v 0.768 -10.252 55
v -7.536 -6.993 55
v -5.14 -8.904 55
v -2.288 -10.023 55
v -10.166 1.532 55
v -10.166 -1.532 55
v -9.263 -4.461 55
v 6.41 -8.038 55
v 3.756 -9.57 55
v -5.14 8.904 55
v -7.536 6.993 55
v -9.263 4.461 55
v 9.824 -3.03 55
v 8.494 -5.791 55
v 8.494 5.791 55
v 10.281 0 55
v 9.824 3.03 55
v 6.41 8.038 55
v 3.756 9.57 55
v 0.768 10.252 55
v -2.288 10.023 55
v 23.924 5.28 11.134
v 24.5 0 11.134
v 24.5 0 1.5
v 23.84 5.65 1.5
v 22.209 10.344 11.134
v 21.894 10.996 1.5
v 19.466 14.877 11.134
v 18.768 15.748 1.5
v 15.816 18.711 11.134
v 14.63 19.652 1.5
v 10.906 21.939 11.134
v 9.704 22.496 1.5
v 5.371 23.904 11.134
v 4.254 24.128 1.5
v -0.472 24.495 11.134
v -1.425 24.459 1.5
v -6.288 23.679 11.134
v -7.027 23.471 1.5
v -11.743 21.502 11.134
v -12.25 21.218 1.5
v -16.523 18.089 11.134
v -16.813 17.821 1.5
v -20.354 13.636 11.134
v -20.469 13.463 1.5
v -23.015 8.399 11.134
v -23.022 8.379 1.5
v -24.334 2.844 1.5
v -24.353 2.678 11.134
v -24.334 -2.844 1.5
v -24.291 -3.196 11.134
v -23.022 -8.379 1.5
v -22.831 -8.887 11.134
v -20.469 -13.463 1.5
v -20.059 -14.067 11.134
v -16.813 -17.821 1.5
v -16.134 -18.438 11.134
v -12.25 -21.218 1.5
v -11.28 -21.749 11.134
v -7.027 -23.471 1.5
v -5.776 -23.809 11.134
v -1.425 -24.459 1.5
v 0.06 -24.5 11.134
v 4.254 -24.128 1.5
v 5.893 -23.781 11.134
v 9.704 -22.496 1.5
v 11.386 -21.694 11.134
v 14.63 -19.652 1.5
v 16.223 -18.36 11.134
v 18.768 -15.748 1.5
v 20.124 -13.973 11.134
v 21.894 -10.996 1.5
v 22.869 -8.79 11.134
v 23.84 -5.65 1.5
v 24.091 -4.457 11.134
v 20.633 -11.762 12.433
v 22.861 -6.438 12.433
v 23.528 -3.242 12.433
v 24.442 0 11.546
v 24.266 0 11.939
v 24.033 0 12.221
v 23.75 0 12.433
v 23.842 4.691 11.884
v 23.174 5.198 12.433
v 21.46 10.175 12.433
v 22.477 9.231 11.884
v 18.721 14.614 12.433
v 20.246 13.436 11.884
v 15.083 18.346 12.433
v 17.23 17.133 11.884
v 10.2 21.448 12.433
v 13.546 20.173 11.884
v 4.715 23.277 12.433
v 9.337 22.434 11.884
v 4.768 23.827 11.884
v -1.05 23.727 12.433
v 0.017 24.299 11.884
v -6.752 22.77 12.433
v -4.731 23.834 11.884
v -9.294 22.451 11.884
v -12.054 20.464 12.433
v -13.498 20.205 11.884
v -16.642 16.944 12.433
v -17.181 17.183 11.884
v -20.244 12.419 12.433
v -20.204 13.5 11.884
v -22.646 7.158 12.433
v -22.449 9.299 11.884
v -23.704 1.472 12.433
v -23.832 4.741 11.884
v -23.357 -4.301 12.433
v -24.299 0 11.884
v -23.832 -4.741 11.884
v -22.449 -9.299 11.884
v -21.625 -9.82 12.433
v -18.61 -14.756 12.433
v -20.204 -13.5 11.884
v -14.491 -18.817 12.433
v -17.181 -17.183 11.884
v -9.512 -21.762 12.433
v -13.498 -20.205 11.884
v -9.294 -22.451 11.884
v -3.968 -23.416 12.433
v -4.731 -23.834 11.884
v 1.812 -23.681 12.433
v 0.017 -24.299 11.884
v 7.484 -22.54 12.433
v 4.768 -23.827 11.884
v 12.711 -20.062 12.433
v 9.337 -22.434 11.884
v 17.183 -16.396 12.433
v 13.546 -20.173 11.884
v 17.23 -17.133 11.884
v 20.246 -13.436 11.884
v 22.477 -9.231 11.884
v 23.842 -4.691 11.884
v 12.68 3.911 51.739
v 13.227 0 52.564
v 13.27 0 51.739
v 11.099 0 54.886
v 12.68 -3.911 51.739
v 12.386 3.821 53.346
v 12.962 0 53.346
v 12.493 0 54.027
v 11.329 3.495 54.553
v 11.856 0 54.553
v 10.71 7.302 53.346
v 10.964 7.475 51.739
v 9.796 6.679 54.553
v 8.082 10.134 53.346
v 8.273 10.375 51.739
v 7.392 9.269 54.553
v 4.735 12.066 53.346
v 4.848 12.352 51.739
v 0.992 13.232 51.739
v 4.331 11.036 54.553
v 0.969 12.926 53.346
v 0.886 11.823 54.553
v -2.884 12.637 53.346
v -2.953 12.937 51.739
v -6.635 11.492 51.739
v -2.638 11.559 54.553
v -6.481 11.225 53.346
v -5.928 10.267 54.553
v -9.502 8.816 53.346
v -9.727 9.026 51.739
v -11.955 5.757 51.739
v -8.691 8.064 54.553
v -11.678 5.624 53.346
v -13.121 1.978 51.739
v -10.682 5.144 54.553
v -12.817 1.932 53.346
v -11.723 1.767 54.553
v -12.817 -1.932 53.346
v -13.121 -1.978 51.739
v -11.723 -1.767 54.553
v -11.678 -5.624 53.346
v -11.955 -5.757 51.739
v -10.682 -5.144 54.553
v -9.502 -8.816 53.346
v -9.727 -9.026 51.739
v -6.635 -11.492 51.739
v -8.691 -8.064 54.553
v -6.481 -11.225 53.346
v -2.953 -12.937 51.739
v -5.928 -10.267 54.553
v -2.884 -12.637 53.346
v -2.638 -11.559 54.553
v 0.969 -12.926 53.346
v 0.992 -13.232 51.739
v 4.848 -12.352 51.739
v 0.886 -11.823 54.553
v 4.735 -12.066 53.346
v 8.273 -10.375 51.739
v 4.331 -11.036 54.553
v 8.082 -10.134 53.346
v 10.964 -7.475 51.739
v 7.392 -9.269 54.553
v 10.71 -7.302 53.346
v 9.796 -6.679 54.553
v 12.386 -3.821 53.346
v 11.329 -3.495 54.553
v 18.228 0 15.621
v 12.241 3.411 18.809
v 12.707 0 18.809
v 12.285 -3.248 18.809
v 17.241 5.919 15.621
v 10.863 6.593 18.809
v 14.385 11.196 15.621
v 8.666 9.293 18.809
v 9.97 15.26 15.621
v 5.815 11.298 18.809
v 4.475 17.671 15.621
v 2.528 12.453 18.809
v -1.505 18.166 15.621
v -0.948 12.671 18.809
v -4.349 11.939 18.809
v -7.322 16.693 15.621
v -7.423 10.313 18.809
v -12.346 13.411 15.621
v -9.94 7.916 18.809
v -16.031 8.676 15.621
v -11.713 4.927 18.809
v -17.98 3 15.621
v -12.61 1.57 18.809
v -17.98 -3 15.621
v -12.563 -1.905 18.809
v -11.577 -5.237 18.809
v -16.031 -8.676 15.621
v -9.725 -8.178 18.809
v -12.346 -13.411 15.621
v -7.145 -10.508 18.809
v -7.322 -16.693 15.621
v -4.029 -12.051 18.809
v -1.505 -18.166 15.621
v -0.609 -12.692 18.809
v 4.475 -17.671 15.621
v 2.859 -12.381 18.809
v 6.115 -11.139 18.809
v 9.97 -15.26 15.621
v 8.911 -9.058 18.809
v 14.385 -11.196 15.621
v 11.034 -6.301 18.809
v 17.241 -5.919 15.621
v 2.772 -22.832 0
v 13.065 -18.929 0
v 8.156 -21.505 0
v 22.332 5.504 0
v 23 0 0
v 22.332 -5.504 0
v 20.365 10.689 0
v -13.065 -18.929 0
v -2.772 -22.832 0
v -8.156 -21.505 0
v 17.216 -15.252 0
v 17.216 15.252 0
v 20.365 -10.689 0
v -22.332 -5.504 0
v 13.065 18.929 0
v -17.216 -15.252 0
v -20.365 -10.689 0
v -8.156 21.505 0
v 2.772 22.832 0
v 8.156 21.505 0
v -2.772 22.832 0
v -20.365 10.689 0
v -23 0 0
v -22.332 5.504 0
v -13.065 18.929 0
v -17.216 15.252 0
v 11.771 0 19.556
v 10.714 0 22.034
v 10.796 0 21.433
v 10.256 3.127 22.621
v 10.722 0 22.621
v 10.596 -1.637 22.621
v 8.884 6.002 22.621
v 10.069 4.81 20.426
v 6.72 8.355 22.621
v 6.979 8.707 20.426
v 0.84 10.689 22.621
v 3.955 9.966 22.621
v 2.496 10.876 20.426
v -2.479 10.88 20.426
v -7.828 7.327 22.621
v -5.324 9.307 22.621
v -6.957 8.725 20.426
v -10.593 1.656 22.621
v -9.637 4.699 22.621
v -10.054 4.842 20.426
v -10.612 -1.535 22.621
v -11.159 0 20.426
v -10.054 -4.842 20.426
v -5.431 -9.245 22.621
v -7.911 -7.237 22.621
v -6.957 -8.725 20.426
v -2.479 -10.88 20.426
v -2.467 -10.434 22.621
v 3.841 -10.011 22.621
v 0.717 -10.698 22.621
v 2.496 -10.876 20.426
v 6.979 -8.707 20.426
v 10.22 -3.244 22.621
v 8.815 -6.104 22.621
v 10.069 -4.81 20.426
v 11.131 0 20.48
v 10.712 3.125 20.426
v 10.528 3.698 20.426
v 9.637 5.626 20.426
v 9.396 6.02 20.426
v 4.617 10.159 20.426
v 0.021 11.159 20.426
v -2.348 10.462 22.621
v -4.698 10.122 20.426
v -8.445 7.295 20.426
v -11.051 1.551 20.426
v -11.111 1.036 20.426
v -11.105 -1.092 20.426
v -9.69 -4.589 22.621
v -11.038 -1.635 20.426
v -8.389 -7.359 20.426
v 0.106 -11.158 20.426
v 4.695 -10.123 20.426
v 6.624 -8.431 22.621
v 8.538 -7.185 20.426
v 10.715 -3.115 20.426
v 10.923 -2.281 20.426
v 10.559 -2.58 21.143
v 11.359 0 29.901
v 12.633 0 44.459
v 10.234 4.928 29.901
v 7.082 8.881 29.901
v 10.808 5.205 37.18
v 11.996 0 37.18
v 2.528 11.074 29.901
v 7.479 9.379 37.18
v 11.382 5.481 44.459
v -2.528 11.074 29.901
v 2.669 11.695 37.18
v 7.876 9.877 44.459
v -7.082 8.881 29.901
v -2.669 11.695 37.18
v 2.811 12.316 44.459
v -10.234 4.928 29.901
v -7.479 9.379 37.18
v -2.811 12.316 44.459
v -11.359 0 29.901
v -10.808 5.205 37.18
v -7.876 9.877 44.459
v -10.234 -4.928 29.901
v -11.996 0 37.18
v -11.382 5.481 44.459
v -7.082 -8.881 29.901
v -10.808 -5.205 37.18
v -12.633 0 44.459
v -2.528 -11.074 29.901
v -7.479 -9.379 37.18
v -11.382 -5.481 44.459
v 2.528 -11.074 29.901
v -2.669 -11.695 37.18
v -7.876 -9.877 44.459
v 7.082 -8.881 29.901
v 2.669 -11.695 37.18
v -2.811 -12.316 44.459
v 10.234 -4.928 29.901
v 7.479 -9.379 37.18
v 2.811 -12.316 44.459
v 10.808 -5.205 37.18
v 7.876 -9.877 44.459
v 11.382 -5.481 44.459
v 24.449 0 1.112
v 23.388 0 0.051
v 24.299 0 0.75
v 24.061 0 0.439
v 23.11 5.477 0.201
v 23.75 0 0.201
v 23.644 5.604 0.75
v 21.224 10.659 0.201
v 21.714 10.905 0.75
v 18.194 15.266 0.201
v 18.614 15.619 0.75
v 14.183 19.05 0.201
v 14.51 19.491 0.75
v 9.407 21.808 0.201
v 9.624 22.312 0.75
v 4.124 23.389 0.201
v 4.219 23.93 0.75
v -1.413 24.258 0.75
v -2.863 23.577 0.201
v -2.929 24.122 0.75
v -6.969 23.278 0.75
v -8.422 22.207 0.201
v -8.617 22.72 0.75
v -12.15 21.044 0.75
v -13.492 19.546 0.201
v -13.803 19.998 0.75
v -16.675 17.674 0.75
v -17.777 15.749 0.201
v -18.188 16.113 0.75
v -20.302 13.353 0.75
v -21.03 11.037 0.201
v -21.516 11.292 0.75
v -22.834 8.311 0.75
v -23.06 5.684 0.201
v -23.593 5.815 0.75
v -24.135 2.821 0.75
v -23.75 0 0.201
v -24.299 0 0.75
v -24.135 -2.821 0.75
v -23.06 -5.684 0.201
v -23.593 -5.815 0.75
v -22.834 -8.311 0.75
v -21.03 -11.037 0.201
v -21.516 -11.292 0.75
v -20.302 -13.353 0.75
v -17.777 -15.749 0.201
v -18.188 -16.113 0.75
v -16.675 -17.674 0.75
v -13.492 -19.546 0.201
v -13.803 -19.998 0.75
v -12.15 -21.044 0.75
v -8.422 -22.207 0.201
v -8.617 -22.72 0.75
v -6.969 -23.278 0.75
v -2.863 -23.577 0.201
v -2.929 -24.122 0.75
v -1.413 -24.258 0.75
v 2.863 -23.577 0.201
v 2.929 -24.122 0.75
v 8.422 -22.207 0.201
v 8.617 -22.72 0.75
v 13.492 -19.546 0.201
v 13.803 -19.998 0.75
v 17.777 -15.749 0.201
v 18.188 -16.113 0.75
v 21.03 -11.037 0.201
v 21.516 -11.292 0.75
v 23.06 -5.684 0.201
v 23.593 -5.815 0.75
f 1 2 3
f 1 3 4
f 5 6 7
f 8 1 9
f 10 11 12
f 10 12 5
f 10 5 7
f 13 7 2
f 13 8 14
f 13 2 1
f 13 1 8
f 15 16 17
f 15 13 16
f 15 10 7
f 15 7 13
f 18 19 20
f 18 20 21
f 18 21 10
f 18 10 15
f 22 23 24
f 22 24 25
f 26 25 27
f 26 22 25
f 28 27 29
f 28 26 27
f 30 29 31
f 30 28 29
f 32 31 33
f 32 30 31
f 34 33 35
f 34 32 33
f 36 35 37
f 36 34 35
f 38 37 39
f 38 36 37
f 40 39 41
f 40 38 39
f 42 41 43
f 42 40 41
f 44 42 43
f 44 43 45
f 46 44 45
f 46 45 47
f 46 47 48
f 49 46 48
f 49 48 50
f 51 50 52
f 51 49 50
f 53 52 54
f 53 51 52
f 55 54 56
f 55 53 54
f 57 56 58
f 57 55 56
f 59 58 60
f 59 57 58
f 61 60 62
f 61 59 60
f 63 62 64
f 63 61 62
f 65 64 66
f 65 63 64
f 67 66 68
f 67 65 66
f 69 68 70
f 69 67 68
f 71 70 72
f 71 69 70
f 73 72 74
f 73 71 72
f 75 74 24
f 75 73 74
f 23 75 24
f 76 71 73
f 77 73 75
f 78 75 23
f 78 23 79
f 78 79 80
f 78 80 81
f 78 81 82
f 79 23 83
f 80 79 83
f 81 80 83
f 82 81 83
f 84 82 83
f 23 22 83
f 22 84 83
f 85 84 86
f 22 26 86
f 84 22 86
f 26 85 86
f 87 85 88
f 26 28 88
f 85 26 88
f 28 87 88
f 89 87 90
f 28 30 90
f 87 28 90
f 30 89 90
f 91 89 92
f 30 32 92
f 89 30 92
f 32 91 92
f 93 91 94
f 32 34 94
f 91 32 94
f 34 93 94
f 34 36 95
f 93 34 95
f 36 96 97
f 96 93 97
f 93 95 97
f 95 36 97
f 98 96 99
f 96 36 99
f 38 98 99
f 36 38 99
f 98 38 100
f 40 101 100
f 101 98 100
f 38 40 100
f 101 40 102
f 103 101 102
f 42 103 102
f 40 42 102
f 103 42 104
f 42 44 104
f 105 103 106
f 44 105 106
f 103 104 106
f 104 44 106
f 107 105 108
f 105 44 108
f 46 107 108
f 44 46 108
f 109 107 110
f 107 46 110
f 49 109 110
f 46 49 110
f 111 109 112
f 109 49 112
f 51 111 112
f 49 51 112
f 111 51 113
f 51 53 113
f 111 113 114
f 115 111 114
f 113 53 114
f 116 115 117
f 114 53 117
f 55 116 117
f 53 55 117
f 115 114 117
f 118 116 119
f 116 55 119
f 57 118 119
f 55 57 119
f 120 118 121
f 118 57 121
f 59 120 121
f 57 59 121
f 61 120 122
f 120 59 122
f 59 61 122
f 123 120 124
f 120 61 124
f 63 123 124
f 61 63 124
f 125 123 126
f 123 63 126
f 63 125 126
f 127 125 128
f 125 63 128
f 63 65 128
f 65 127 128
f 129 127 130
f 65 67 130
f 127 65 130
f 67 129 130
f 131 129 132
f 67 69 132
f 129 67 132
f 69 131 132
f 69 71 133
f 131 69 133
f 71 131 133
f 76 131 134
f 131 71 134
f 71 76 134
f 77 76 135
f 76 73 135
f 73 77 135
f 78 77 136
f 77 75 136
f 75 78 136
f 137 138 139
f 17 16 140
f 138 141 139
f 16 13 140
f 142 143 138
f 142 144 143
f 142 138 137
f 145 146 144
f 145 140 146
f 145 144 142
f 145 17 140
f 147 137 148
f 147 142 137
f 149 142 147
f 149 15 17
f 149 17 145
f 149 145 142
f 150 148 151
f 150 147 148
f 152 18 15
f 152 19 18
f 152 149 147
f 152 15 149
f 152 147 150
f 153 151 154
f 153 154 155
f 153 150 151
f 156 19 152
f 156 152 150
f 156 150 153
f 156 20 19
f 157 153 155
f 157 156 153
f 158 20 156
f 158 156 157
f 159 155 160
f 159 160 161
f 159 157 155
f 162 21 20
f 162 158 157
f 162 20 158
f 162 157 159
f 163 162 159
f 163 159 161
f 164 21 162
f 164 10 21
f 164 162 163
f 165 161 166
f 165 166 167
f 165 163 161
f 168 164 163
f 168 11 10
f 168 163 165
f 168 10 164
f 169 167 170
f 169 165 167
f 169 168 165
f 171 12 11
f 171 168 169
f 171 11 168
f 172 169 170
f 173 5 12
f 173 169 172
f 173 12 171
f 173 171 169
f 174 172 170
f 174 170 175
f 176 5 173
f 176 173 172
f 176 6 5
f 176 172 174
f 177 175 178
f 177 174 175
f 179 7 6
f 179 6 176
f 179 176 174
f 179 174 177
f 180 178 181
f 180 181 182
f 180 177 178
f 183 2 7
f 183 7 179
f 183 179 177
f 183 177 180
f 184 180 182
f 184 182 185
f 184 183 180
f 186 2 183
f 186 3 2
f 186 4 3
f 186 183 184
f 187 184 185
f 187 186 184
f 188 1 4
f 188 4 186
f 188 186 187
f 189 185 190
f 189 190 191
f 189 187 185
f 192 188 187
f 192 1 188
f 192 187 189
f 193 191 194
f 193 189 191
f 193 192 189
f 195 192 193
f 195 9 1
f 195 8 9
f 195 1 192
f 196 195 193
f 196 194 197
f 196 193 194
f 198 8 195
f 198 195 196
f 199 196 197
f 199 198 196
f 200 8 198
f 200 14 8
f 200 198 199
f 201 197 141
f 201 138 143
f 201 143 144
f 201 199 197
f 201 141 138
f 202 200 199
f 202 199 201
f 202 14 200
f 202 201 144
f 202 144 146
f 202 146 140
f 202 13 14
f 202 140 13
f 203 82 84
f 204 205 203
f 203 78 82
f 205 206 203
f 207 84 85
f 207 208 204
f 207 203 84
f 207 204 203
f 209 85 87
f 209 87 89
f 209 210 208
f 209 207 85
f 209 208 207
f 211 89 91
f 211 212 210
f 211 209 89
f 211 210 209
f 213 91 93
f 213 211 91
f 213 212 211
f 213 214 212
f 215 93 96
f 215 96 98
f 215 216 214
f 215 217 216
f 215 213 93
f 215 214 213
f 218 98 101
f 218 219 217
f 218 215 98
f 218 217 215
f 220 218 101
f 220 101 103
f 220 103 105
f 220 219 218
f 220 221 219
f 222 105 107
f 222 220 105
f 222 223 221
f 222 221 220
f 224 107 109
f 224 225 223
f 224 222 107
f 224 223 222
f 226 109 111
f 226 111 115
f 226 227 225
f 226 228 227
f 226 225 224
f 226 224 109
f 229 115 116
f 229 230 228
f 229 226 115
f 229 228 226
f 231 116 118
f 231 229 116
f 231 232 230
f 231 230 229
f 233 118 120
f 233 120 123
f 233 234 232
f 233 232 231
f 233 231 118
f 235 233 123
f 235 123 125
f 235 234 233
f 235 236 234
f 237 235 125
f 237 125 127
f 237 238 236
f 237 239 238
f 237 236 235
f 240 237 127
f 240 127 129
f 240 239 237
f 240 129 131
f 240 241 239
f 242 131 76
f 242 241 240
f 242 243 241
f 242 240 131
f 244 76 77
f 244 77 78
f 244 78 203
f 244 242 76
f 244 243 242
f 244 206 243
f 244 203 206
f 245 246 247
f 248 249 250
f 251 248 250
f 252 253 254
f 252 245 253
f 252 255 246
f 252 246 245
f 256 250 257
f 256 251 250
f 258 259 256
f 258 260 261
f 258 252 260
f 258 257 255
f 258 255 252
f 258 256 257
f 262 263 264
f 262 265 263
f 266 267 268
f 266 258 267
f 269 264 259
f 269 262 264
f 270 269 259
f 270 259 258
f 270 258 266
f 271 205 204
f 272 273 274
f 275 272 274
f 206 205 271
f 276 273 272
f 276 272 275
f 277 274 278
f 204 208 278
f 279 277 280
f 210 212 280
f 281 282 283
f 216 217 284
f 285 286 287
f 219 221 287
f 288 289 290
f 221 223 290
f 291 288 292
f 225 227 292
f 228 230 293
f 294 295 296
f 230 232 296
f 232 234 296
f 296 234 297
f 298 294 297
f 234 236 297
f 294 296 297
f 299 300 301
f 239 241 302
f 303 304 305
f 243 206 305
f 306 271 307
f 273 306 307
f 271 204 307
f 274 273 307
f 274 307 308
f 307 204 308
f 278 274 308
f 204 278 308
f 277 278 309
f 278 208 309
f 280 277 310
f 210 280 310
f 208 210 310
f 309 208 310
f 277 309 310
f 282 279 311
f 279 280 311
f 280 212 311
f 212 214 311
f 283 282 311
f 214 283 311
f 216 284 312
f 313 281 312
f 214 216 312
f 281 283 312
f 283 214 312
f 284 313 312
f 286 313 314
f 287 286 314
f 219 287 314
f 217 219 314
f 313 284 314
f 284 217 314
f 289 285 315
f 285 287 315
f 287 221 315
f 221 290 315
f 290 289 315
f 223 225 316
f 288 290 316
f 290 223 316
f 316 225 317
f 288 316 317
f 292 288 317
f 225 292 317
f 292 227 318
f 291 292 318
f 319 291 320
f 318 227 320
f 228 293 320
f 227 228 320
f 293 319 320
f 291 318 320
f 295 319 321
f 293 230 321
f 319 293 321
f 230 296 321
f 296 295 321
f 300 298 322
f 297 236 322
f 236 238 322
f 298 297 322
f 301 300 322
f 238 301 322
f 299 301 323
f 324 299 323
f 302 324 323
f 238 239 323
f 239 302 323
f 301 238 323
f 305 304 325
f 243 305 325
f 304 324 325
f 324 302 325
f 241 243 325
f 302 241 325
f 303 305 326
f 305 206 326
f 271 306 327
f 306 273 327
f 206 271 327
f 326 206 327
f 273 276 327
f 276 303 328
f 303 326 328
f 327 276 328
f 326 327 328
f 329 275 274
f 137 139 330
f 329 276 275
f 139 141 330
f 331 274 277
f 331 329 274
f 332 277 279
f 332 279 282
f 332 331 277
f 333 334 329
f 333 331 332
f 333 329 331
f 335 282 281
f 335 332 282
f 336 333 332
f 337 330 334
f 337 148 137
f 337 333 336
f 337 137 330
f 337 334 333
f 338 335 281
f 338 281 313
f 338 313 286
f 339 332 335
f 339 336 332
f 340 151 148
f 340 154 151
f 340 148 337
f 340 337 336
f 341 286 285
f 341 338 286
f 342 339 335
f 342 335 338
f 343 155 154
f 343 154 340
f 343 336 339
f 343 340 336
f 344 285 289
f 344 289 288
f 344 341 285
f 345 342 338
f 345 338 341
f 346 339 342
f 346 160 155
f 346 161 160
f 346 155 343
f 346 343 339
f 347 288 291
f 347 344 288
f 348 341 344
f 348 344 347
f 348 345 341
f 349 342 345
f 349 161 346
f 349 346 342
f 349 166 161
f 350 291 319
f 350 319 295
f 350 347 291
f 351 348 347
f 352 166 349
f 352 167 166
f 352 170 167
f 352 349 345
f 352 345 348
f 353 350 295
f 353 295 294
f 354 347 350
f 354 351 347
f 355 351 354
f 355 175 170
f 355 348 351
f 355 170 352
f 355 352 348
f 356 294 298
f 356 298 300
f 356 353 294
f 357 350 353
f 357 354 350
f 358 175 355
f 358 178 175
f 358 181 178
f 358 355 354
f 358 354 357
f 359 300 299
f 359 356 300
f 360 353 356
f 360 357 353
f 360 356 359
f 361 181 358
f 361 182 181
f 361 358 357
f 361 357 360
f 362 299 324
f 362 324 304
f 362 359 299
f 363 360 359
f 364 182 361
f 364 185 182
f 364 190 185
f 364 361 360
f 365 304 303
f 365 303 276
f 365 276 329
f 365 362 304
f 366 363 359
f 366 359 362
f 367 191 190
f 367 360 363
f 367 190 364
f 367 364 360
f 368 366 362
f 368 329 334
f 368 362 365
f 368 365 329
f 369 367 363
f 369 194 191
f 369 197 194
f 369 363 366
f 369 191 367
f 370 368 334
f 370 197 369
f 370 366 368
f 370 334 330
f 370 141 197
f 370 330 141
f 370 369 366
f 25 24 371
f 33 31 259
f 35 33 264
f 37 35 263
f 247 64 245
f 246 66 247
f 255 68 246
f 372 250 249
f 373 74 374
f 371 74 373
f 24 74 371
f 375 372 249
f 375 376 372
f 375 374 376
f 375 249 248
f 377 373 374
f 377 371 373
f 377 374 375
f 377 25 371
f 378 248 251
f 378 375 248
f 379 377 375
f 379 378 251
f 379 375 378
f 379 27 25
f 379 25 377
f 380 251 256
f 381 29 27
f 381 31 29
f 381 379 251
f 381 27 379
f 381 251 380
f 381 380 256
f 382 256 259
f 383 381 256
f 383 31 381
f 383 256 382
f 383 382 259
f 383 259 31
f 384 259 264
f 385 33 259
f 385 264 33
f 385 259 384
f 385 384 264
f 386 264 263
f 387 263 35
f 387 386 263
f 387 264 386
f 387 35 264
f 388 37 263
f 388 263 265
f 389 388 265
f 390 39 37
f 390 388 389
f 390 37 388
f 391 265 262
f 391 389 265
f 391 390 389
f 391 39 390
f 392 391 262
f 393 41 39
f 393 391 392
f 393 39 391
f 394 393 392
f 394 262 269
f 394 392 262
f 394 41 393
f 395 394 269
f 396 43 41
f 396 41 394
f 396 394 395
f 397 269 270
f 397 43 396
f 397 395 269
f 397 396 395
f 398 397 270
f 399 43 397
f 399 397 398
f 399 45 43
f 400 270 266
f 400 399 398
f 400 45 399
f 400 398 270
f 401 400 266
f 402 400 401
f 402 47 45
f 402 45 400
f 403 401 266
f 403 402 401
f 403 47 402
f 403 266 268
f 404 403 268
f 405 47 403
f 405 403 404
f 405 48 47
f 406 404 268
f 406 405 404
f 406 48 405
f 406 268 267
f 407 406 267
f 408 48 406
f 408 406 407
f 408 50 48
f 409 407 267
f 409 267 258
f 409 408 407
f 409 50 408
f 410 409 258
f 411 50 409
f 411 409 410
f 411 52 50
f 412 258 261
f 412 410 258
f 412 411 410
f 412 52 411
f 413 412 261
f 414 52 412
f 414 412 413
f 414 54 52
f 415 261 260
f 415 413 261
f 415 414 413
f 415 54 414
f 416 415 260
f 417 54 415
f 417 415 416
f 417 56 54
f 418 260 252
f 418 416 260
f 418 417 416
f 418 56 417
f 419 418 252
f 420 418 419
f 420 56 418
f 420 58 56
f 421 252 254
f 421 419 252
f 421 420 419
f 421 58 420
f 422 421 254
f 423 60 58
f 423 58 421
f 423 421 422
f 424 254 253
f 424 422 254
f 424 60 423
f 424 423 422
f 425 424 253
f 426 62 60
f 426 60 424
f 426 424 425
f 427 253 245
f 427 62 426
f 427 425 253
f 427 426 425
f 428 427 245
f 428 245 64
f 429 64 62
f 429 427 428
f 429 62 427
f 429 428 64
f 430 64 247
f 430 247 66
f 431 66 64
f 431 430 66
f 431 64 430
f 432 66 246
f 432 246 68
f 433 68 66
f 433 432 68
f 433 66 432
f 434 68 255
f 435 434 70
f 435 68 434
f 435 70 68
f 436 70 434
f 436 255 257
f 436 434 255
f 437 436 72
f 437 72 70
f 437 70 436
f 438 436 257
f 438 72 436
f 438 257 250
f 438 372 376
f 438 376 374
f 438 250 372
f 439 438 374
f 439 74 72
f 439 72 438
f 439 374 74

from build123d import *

# Parameters (mm, degrees)
F2_R = 1.5
F3_R = 4
F4_R = 3


with BuildPart() as f1:
    # F0 (on Front) → F1 (revolve)
    with BuildSketch(Plane.XZ):
        Polygon((0, 55), (0, 0), (24.5, 0), (24.5, 12), (10.5, 20.082904), (13.55485, 55), align=None)
    revolve(axis=Axis((0, 0, 27.5), (0, 0, 1)))

    # F2
    f2_edges = [f1.edges().sort_by_distance(p)[0] for p in [
        (-24.5, 0, 0),
        (-24.5, 0, 12),
    ]]
    fillet(f2_edges, radius=F2_R)

    # F3
    f3_edges = [f1.edges().sort_by_distance(p)[0] for p in [
        (-10.5, 0, 20.082904),
    ]]
    fillet(f3_edges, radius=F3_R)

    # F4
    f4_edges = [f1.edges().sort_by_distance(p)[0] for p in [
        (-13.55485, 0, 55),
    ]]
    fillet(f4_edges, radius=F4_R)


solid = f1.part
